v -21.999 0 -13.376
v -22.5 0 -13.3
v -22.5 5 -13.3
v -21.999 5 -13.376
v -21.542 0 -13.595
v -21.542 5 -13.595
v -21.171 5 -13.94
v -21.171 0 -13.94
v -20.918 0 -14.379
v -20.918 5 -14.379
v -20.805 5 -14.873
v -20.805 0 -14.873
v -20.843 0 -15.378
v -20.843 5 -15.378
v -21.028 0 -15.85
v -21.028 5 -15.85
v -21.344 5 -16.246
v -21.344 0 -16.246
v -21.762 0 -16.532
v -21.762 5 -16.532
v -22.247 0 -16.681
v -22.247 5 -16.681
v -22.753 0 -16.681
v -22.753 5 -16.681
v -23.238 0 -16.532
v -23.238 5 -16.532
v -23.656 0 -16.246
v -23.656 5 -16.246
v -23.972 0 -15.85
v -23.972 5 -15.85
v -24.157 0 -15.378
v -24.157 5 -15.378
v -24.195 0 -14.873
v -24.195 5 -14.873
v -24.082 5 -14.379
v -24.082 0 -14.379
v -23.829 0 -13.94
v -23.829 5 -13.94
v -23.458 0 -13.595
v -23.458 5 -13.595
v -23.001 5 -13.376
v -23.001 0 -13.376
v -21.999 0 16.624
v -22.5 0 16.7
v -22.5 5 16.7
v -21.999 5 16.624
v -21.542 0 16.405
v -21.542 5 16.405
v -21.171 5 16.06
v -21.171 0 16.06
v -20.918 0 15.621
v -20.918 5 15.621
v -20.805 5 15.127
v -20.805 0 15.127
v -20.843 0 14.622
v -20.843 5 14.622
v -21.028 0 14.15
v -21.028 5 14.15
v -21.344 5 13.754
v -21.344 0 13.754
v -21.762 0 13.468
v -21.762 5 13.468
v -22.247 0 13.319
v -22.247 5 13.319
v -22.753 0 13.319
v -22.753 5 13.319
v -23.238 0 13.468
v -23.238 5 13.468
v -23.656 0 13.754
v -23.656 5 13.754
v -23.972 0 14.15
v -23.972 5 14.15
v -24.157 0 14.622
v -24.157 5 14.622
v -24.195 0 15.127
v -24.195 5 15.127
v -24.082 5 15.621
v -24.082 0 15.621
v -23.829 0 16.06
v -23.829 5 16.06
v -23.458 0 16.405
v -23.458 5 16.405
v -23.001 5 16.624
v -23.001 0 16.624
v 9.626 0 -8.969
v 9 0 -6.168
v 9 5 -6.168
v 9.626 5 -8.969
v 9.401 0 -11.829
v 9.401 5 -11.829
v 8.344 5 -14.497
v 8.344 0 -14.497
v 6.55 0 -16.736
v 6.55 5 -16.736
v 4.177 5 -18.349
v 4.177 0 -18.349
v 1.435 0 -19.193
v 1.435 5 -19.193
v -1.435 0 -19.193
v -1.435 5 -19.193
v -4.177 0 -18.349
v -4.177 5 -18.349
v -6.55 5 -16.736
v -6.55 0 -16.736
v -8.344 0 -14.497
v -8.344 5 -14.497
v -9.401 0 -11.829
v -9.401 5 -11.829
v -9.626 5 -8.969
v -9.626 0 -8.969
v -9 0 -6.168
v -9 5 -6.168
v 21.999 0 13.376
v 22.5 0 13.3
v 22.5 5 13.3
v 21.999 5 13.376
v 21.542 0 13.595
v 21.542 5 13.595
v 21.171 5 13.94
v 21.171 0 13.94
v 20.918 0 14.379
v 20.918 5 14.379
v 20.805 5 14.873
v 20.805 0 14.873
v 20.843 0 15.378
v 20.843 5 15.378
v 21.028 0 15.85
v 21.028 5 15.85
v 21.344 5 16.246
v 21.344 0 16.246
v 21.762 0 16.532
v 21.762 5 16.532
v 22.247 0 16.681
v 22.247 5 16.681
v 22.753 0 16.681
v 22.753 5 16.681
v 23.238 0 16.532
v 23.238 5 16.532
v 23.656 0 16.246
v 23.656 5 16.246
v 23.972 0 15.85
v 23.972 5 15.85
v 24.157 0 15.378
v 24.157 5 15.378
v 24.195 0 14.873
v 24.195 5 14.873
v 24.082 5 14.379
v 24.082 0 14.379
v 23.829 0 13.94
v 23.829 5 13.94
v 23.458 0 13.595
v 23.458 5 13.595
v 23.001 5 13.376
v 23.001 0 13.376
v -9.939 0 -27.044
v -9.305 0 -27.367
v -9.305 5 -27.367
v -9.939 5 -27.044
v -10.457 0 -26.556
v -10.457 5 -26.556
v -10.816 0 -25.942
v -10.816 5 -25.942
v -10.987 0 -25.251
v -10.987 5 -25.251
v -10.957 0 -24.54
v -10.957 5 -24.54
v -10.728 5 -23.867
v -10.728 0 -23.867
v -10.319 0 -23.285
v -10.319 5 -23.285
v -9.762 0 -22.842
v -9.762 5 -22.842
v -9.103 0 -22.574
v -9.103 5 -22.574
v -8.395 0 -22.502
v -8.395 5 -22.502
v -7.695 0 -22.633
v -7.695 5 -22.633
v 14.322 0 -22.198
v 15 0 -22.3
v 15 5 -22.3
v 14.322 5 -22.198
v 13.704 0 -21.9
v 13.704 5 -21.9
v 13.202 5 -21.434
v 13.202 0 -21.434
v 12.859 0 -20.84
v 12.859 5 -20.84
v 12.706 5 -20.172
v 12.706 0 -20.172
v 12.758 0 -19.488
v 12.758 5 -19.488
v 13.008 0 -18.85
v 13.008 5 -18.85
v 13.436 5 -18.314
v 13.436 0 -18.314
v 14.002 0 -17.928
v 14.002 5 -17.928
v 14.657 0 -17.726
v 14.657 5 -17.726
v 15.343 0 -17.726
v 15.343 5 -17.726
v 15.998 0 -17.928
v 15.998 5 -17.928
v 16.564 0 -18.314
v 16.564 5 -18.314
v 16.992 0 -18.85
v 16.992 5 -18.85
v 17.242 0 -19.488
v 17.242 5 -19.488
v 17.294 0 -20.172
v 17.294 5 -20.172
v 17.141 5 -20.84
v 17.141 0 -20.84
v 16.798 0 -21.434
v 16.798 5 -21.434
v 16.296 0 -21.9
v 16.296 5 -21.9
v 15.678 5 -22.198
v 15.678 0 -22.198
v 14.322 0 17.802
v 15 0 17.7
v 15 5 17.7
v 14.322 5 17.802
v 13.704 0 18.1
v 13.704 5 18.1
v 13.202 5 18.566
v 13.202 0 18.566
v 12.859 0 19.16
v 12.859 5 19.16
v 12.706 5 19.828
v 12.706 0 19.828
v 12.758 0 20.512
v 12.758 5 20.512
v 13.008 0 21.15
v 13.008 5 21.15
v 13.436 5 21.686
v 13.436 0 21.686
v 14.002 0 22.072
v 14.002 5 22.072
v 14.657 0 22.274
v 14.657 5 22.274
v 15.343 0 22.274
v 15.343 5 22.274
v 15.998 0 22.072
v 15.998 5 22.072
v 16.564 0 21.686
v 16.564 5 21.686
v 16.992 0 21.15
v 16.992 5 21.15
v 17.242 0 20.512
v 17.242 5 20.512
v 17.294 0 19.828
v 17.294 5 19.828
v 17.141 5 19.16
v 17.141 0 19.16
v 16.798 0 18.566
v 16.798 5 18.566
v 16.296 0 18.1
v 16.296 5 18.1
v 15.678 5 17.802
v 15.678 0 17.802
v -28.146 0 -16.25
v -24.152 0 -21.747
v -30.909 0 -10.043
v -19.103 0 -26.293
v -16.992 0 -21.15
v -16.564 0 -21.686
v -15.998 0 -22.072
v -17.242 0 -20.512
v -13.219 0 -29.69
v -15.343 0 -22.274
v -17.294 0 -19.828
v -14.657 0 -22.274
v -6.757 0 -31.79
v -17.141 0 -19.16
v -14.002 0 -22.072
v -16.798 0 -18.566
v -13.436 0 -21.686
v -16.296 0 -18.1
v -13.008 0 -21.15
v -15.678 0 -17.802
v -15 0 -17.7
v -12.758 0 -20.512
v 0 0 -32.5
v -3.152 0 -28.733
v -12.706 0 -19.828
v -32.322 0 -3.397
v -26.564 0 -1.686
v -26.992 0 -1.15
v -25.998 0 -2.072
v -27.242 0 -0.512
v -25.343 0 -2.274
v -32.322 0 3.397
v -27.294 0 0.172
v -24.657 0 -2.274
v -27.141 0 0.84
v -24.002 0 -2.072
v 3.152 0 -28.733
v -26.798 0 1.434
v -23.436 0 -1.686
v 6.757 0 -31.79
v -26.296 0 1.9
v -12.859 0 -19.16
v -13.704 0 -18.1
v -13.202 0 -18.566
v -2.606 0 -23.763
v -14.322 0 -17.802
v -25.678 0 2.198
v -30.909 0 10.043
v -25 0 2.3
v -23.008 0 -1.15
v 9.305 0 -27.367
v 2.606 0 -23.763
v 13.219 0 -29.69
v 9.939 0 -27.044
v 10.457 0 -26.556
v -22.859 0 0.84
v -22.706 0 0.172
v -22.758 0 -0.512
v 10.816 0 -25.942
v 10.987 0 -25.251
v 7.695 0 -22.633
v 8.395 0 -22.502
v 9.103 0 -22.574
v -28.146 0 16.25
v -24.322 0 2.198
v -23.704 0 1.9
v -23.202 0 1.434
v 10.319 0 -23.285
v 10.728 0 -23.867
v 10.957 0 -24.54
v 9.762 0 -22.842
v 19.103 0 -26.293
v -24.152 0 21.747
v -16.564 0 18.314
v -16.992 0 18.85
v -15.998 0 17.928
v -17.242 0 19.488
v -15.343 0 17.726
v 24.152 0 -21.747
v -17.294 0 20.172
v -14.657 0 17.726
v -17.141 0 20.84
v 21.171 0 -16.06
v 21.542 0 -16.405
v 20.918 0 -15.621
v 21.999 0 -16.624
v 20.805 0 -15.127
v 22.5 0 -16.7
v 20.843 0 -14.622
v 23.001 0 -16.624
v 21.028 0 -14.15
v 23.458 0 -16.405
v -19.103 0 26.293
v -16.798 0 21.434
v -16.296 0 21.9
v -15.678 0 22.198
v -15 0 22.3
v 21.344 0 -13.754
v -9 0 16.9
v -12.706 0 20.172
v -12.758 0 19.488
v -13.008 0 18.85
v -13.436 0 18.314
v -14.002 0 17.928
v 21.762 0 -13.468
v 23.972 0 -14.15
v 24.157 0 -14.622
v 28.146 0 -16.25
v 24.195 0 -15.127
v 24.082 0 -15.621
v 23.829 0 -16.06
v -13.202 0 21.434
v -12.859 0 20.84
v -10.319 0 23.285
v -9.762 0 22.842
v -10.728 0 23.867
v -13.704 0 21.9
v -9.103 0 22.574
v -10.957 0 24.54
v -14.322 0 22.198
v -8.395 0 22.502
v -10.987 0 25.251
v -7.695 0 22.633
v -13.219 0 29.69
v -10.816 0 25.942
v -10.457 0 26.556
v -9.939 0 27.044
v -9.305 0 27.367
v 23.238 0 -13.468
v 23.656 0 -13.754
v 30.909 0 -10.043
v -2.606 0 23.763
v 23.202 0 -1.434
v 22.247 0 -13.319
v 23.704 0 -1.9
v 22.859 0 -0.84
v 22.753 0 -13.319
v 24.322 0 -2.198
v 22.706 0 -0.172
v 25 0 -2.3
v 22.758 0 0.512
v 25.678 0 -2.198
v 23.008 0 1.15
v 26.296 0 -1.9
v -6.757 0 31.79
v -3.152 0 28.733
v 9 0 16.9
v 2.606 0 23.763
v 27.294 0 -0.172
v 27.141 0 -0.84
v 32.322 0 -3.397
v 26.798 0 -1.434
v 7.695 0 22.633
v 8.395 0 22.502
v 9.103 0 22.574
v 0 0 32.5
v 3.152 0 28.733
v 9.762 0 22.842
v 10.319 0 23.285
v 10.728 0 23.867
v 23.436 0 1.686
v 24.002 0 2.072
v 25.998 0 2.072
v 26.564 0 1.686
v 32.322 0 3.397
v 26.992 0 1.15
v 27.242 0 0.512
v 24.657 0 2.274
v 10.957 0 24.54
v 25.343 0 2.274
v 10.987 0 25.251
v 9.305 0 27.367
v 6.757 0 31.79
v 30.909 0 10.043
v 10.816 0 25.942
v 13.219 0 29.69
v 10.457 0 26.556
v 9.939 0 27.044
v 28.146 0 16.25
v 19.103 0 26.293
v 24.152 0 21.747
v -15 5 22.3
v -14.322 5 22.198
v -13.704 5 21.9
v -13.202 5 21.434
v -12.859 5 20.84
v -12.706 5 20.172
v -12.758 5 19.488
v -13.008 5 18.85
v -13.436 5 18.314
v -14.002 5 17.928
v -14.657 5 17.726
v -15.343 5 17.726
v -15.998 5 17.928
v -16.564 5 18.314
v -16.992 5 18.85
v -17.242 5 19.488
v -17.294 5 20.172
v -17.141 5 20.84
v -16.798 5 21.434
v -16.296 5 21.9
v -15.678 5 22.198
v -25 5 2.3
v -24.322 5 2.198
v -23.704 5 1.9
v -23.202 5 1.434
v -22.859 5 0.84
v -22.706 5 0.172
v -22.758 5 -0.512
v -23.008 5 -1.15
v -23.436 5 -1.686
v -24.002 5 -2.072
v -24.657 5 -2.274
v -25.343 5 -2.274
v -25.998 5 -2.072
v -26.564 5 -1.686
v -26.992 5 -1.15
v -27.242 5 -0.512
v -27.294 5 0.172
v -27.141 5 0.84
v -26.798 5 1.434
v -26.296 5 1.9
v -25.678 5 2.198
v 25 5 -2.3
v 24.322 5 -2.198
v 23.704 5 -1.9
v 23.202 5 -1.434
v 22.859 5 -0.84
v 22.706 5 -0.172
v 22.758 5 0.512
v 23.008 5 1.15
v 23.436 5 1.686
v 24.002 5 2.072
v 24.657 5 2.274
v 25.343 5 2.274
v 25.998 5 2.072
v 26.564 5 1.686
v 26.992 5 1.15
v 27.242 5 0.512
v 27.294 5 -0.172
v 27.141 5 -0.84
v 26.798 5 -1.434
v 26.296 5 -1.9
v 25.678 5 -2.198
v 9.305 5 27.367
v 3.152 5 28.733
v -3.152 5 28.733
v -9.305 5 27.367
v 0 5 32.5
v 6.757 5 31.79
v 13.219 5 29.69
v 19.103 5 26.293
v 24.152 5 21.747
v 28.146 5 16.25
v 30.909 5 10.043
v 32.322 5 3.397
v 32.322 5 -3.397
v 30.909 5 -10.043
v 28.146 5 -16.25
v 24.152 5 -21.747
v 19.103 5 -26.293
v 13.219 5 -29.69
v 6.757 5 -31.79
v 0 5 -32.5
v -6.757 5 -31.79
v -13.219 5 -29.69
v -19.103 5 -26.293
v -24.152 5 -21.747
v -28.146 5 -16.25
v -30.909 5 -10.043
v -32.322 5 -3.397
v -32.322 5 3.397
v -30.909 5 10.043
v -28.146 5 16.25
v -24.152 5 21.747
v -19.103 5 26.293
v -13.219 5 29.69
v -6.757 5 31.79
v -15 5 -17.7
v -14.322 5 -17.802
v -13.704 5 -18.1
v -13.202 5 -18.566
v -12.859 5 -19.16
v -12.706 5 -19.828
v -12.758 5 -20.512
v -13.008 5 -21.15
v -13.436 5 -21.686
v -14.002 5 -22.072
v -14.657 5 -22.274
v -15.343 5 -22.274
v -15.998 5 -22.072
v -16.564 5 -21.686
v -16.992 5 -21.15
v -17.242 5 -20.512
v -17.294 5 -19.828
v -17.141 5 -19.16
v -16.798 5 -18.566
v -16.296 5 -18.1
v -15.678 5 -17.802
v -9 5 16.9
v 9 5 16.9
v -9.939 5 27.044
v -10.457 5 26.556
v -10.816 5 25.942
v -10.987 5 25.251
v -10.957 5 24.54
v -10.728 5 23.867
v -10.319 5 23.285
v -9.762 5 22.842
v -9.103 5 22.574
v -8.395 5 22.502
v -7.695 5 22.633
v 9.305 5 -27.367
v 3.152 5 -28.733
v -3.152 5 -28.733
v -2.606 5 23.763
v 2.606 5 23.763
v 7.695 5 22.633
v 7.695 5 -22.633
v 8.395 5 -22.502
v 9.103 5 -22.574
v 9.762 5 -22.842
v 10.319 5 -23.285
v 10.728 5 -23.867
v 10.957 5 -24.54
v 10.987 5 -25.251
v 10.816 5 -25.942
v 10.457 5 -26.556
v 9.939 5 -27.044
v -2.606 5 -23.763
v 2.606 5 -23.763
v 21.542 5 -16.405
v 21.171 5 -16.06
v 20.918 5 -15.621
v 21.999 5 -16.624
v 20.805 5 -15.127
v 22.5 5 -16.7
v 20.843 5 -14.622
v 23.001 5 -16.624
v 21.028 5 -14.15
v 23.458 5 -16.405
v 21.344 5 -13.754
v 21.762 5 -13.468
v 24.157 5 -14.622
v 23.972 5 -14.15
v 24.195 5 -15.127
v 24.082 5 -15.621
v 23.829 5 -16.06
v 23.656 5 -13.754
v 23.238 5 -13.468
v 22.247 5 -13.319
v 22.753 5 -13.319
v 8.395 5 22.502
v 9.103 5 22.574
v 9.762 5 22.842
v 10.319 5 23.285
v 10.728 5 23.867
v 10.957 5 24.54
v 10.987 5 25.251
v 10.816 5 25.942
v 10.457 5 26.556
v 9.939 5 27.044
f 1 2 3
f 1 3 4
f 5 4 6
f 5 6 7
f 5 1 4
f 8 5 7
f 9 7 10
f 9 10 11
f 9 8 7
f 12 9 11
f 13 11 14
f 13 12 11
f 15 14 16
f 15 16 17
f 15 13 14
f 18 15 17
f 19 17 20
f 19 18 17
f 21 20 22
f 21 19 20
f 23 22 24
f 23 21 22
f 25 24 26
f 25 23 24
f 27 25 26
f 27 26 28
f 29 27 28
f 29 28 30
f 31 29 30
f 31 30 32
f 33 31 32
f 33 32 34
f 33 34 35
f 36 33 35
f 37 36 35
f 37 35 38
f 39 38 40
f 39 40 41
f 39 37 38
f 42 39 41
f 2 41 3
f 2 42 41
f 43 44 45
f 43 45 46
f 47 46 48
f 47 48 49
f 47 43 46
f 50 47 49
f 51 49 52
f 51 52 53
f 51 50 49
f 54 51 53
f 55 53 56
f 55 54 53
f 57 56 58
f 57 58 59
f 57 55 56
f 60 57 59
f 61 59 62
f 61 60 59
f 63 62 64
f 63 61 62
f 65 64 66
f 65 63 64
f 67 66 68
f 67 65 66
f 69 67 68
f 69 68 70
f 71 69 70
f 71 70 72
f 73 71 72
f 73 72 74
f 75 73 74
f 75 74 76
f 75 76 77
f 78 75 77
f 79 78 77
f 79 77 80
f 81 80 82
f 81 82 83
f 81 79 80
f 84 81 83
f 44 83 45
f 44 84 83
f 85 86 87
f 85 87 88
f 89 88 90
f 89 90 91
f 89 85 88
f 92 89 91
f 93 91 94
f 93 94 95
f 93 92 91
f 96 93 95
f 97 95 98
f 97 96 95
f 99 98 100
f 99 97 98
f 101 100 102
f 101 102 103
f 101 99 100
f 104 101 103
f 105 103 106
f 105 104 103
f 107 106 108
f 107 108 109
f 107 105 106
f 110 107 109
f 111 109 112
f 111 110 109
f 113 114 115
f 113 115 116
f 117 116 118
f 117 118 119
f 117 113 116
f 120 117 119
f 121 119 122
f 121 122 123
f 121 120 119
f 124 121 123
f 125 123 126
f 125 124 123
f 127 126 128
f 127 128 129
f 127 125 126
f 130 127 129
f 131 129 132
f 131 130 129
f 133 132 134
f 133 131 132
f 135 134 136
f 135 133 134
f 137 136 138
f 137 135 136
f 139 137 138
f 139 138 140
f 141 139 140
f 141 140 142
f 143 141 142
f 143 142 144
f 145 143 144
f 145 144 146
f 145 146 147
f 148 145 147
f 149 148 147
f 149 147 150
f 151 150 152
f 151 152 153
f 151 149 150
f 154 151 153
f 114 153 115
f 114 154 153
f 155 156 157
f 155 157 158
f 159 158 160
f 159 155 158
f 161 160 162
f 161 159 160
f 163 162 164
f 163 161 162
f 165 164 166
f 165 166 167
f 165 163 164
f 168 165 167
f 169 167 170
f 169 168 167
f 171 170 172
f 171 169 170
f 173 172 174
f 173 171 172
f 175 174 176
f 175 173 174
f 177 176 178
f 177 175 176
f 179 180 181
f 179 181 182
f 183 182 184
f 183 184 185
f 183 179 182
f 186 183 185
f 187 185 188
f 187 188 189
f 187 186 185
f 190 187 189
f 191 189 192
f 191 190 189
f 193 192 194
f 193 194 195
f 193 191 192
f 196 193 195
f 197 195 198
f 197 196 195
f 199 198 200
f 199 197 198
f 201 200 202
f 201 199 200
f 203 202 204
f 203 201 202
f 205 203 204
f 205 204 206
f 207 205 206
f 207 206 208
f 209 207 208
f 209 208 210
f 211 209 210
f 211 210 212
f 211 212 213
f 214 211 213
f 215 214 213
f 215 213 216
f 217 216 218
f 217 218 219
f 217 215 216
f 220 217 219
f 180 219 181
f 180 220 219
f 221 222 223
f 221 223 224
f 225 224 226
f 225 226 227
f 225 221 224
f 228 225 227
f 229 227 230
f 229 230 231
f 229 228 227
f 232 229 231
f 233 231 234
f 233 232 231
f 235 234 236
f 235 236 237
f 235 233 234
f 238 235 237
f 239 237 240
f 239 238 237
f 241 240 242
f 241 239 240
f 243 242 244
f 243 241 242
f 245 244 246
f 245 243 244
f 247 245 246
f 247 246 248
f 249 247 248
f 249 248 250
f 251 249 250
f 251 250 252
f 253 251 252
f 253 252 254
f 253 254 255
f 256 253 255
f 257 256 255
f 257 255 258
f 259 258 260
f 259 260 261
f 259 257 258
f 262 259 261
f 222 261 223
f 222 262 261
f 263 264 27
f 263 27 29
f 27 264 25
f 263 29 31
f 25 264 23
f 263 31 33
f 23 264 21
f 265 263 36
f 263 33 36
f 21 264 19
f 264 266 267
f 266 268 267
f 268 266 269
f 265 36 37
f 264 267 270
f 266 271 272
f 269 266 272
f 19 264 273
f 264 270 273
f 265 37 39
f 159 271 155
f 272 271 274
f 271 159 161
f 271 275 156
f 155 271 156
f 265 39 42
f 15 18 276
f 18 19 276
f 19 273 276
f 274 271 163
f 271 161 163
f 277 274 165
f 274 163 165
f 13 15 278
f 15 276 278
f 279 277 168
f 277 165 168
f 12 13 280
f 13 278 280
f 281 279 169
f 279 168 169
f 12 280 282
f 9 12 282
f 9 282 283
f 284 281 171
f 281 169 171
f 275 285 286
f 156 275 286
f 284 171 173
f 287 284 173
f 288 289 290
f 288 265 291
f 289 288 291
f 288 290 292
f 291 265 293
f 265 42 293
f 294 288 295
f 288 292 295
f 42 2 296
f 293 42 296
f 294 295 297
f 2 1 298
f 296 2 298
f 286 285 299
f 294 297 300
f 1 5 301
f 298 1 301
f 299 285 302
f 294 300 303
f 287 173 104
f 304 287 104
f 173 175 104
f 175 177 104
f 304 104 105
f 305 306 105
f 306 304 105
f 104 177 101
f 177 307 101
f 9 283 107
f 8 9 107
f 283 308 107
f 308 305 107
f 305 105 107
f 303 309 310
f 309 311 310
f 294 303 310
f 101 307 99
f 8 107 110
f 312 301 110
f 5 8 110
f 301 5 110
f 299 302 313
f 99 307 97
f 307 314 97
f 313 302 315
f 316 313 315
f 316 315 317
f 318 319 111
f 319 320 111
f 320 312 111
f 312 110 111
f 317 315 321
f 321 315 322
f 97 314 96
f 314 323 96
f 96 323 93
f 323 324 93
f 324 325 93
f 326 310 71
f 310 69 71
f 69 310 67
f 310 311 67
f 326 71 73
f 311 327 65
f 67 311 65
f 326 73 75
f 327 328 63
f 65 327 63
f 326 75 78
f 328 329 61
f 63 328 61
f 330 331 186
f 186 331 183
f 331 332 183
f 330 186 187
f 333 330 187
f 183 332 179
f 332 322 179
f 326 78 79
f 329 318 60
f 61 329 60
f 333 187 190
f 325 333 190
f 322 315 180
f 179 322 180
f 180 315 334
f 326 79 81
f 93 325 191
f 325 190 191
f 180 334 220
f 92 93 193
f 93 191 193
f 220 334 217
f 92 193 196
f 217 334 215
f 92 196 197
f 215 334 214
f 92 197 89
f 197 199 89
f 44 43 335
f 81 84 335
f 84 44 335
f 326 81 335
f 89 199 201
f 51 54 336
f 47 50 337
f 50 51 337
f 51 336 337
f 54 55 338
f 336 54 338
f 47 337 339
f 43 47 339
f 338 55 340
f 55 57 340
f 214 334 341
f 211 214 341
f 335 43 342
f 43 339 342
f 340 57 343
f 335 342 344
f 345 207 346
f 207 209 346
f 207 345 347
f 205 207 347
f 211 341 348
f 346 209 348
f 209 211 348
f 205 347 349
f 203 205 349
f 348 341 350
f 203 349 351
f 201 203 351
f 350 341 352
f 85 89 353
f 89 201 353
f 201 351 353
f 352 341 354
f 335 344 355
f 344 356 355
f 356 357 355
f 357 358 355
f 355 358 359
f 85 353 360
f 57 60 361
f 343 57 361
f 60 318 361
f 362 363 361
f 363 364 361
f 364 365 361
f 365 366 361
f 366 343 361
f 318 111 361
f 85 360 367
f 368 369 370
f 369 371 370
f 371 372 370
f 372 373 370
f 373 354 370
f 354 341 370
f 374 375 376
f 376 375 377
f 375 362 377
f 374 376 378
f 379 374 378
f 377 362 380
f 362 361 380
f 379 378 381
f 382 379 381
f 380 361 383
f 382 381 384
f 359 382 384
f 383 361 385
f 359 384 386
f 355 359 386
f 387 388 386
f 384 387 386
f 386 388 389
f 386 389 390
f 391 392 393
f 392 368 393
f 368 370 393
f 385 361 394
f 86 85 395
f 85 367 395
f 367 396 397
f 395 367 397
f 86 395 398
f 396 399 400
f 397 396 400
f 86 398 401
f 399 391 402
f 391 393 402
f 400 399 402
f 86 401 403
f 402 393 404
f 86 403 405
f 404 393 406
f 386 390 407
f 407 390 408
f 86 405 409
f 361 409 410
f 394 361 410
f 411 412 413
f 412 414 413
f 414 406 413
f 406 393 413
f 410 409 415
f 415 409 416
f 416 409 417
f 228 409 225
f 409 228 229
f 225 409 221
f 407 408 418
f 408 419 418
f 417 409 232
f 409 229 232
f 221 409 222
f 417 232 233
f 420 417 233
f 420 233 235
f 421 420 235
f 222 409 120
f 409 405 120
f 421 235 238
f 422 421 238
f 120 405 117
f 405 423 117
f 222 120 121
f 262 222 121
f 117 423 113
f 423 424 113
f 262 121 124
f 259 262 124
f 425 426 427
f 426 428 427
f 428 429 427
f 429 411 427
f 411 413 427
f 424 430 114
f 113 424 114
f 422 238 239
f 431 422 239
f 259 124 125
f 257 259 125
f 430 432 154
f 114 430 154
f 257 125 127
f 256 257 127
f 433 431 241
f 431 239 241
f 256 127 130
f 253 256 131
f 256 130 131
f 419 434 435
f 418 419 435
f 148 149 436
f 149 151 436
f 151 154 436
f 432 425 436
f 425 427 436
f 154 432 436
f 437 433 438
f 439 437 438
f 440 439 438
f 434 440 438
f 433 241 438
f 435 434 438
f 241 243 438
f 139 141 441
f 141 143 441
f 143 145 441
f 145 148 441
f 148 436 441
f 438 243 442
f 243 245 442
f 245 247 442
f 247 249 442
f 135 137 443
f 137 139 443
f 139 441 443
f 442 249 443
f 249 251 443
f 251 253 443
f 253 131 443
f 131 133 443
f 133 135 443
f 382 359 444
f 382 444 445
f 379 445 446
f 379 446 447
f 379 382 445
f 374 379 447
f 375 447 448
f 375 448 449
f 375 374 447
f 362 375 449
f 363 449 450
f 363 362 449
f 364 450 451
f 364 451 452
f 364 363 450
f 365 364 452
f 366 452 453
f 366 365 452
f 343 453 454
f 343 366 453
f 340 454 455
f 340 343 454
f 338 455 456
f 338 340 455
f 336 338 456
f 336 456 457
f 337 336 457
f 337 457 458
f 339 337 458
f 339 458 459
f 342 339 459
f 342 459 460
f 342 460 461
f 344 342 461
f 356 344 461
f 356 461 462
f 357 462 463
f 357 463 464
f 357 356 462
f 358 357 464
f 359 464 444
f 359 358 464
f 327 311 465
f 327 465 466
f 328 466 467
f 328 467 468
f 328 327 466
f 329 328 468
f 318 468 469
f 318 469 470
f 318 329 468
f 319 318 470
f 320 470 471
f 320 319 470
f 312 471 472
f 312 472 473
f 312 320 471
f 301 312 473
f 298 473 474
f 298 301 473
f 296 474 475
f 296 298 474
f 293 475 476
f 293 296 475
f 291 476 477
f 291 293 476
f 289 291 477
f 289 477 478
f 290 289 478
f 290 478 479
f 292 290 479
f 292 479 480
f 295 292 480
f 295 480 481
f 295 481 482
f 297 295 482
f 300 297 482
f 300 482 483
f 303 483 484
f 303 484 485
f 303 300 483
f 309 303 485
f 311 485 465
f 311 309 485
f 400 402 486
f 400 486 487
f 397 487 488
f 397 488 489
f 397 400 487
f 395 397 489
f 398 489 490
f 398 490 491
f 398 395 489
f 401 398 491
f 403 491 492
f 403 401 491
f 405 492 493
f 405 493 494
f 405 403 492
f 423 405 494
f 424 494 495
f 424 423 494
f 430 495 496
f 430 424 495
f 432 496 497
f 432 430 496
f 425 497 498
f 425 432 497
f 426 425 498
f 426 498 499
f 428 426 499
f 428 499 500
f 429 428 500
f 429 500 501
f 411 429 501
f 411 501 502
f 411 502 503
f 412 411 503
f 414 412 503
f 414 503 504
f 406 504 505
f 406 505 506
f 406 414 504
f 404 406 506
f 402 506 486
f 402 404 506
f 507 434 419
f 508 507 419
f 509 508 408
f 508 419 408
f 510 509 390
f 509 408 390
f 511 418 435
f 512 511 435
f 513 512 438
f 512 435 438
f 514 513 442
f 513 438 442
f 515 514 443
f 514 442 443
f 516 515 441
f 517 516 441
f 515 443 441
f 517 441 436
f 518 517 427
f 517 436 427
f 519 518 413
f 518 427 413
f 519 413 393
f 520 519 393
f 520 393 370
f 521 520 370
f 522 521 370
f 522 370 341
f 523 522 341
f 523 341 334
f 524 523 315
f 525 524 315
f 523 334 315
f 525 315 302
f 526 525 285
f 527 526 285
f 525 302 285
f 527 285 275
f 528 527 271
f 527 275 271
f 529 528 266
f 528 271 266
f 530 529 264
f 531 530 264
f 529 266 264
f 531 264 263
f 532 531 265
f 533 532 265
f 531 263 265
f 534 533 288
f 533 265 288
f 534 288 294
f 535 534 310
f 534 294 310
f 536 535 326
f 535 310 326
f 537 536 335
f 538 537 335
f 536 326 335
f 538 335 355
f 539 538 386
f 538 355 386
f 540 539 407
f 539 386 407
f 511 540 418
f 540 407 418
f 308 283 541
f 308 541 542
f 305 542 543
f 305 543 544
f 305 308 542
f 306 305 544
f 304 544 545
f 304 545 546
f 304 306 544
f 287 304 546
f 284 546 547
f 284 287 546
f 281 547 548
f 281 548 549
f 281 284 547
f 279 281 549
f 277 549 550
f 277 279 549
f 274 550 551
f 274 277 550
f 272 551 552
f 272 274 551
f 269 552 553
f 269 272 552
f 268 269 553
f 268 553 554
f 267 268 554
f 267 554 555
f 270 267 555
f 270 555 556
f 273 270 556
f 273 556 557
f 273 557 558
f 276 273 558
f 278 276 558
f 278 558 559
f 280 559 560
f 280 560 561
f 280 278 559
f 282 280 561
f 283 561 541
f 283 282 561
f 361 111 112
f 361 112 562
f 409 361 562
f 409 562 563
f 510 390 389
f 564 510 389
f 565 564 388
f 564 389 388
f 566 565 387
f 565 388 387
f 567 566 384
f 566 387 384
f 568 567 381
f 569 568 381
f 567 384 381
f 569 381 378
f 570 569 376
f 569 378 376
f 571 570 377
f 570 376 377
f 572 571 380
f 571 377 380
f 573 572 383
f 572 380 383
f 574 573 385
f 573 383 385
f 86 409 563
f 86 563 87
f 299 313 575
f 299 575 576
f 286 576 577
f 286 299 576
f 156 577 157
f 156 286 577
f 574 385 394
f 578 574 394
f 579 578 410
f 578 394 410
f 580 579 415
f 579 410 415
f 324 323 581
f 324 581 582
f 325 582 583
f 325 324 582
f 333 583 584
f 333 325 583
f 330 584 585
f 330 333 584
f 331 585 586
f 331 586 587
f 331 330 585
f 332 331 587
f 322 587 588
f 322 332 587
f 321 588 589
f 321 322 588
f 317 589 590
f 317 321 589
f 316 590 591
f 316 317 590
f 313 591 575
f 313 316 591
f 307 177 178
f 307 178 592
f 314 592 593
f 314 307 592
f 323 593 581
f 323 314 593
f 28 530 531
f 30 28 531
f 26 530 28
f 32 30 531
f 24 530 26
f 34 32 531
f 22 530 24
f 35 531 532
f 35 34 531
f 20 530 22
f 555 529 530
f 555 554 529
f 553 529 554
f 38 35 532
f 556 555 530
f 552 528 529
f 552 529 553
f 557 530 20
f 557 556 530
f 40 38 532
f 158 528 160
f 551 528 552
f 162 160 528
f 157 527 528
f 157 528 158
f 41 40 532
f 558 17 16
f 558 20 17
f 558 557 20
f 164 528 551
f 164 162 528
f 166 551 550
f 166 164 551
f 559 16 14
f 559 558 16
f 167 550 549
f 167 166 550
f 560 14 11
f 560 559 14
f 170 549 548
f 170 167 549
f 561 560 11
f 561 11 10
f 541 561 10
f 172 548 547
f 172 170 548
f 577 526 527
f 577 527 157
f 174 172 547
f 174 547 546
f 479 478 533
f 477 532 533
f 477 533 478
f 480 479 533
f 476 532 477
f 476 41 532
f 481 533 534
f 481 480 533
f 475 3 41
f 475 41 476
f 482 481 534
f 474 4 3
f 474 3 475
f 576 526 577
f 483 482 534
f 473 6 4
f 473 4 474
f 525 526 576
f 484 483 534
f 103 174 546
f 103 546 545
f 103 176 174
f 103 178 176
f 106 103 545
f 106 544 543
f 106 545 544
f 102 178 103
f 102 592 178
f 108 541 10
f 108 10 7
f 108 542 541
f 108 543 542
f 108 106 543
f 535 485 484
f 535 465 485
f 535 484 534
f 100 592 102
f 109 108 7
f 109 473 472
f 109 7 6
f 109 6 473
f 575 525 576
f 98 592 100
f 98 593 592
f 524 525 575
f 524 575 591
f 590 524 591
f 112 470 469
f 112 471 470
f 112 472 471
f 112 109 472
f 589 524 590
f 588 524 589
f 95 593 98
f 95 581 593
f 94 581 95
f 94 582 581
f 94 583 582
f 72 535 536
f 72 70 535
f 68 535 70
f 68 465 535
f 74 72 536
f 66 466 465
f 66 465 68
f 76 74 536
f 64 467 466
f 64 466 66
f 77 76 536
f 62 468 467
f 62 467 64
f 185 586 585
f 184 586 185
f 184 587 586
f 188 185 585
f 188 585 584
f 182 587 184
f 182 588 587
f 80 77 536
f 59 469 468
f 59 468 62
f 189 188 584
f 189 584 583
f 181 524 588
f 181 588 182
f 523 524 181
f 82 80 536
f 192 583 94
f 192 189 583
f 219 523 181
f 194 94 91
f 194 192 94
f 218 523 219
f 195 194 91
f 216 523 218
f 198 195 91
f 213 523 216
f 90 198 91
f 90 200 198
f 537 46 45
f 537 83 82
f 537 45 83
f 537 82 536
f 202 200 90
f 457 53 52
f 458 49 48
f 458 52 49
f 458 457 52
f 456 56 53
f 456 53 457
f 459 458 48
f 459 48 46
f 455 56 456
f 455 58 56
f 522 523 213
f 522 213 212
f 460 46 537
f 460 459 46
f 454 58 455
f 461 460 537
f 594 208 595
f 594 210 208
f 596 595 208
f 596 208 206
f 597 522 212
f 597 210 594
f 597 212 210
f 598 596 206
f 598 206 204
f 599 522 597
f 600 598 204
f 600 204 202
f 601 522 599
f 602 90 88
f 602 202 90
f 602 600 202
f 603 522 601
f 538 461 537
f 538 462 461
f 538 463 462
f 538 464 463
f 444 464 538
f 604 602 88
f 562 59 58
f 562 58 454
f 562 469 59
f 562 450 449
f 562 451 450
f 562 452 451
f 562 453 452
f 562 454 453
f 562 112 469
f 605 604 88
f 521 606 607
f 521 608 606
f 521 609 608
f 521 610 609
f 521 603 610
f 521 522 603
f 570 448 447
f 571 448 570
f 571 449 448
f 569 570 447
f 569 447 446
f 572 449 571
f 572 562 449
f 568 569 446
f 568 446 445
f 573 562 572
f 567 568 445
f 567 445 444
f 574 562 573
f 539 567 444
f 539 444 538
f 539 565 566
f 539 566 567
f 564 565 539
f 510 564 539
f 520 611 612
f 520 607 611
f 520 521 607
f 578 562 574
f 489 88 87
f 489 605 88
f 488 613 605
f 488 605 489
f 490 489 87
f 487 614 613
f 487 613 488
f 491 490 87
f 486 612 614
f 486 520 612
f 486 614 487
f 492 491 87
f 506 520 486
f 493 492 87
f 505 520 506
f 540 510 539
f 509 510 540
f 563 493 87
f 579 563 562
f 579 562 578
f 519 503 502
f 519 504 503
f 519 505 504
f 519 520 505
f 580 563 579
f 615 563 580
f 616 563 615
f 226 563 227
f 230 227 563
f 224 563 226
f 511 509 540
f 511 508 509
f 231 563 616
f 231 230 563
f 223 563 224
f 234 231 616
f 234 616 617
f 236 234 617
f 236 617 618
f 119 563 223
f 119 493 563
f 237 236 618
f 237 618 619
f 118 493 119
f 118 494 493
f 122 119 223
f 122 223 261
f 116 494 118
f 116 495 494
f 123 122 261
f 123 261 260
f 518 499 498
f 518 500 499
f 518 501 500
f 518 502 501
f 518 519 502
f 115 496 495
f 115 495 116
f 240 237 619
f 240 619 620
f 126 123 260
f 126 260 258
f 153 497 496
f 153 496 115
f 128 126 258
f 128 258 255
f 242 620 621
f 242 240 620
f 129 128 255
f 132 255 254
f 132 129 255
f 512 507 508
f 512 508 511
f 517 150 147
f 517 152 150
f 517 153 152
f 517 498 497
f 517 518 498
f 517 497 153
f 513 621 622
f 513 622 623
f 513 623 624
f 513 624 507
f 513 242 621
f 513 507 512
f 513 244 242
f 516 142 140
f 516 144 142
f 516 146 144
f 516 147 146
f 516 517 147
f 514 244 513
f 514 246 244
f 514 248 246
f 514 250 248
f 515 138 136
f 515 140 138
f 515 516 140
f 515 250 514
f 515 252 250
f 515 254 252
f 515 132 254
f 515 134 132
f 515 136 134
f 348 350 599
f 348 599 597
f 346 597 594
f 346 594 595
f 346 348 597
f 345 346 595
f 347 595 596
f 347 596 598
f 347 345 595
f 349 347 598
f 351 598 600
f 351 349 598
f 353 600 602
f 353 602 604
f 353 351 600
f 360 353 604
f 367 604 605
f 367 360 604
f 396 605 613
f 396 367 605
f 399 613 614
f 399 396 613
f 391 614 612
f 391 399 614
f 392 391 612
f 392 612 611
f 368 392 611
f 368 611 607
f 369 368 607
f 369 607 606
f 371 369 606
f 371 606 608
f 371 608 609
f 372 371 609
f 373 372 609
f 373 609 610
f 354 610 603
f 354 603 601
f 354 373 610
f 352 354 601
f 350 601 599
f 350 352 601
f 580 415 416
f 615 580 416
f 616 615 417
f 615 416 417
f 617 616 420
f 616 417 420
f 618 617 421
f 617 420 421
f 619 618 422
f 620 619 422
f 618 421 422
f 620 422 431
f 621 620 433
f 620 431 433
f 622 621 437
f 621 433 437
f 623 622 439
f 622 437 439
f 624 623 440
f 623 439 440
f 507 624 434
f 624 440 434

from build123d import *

# Parameters (mm, degrees)
SKETCH1_R           = 32.5
SKETCH1_R_2         = 2.3
SKETCH1_R_3         = 1.7
BOSS_EXTRUDE1_DEPTH = 5


with BuildPart() as part:
    # Sketch1 → Boss-Extrude1 (new body)
    with BuildSketch(Plane(origin=(0, 0, 0), x_dir=(1, 0, 0), z_dir=(0, 1, 0))):
        with Locations(Location((0, 0, 0), (0, 0, 270))):
            Circle(SKETCH1_R)
        with Locations(Location((-15, 20, 0), (0, 0, 270))):
            Circle(SKETCH1_R_2, mode=Mode.SUBTRACT)
        with Locations(Location((-22.5, 15, 0), (0, 0, 270))):
            Circle(SKETCH1_R_3, mode=Mode.SUBTRACT)
        with Locations(Location((-15, -20, 0), (0, 0, 270))):
            Circle(SKETCH1_R_2, mode=Mode.SUBTRACT)
        with Locations(Location((-25, 0, 0), (0, 0, 270))):
            Circle(SKETCH1_R_2, mode=Mode.SUBTRACT)
        with Locations(Location((-22.5, -15, 0), (0, 0, 270))):
            Circle(SKETCH1_R_3, mode=Mode.SUBTRACT)
        with Locations(Location((15, -20, 0), (0, 0, 90))):
            Circle(SKETCH1_R_2, mode=Mode.SUBTRACT)
        with Locations(Location((22.5, -15, 0), (0, 0, 90))):
            Circle(SKETCH1_R_3, mode=Mode.SUBTRACT)
        with Locations(Location((25, 0, 0), (0, 0, 90))):
            Circle(SKETCH1_R_2, mode=Mode.SUBTRACT)
        with Locations(Location((22.5, 15, 0), (0, 0, 90))):
            Circle(SKETCH1_R_3, mode=Mode.SUBTRACT)
        with Locations(Location((15, 20, 0), (0, 0, 90))):
            Circle(SKETCH1_R_2, mode=Mode.SUBTRACT)
        with BuildLine():
            Line((-9, 6.168261928), (-9, -16.9))
            Line((-9, -16.9), (9, -16.9))
            Line((9, -16.9), (9, 6.168261928))
            ThreePointArc((9, 6.168261928), (0, 19.3), (-9, 6.168261928))
        make_face(mode=Mode.SUBTRACT)
        with BuildLine():
            ThreePointArc((7.695243167, 22.633068138), (10.866931862, 24.195243167), (9.304756833, 27.366931862))
            ThreePointArc((9.304756833, 27.366931862), (0, 28.905491853), (-9.304756833, 27.366931862))
            ThreePointArc((-9.304756833, 27.366931862), (-10.866931862, 24.195243167), (-7.695243167, 22.633068138))
            ThreePointArc((-7.695243167, 22.633068138), (0, 23.905491853), (7.695243167, 22.633068138))
        make_face(mode=Mode.SUBTRACT)
        with BuildLine():
            ThreePointArc((7.695243167, -22.633068138), (10.866931862, -24.195243167), (9.304756833, -27.366931862))
            ThreePointArc((9.304756833, -27.366931862), (0, -28.905491853), (-9.304756833, -27.366931862))
            ThreePointArc((-9.304756833, -27.366931862), (-10.866931862, -24.195243167), (-7.695243167, -22.633068138))
            ThreePointArc((-7.695243167, -22.633068138), (0, -23.905491853), (7.695243167, -22.633068138))
        make_face(mode=Mode.SUBTRACT)
    extrude(amount=BOSS_EXTRUDE1_DEPTH)


solid = part.part
